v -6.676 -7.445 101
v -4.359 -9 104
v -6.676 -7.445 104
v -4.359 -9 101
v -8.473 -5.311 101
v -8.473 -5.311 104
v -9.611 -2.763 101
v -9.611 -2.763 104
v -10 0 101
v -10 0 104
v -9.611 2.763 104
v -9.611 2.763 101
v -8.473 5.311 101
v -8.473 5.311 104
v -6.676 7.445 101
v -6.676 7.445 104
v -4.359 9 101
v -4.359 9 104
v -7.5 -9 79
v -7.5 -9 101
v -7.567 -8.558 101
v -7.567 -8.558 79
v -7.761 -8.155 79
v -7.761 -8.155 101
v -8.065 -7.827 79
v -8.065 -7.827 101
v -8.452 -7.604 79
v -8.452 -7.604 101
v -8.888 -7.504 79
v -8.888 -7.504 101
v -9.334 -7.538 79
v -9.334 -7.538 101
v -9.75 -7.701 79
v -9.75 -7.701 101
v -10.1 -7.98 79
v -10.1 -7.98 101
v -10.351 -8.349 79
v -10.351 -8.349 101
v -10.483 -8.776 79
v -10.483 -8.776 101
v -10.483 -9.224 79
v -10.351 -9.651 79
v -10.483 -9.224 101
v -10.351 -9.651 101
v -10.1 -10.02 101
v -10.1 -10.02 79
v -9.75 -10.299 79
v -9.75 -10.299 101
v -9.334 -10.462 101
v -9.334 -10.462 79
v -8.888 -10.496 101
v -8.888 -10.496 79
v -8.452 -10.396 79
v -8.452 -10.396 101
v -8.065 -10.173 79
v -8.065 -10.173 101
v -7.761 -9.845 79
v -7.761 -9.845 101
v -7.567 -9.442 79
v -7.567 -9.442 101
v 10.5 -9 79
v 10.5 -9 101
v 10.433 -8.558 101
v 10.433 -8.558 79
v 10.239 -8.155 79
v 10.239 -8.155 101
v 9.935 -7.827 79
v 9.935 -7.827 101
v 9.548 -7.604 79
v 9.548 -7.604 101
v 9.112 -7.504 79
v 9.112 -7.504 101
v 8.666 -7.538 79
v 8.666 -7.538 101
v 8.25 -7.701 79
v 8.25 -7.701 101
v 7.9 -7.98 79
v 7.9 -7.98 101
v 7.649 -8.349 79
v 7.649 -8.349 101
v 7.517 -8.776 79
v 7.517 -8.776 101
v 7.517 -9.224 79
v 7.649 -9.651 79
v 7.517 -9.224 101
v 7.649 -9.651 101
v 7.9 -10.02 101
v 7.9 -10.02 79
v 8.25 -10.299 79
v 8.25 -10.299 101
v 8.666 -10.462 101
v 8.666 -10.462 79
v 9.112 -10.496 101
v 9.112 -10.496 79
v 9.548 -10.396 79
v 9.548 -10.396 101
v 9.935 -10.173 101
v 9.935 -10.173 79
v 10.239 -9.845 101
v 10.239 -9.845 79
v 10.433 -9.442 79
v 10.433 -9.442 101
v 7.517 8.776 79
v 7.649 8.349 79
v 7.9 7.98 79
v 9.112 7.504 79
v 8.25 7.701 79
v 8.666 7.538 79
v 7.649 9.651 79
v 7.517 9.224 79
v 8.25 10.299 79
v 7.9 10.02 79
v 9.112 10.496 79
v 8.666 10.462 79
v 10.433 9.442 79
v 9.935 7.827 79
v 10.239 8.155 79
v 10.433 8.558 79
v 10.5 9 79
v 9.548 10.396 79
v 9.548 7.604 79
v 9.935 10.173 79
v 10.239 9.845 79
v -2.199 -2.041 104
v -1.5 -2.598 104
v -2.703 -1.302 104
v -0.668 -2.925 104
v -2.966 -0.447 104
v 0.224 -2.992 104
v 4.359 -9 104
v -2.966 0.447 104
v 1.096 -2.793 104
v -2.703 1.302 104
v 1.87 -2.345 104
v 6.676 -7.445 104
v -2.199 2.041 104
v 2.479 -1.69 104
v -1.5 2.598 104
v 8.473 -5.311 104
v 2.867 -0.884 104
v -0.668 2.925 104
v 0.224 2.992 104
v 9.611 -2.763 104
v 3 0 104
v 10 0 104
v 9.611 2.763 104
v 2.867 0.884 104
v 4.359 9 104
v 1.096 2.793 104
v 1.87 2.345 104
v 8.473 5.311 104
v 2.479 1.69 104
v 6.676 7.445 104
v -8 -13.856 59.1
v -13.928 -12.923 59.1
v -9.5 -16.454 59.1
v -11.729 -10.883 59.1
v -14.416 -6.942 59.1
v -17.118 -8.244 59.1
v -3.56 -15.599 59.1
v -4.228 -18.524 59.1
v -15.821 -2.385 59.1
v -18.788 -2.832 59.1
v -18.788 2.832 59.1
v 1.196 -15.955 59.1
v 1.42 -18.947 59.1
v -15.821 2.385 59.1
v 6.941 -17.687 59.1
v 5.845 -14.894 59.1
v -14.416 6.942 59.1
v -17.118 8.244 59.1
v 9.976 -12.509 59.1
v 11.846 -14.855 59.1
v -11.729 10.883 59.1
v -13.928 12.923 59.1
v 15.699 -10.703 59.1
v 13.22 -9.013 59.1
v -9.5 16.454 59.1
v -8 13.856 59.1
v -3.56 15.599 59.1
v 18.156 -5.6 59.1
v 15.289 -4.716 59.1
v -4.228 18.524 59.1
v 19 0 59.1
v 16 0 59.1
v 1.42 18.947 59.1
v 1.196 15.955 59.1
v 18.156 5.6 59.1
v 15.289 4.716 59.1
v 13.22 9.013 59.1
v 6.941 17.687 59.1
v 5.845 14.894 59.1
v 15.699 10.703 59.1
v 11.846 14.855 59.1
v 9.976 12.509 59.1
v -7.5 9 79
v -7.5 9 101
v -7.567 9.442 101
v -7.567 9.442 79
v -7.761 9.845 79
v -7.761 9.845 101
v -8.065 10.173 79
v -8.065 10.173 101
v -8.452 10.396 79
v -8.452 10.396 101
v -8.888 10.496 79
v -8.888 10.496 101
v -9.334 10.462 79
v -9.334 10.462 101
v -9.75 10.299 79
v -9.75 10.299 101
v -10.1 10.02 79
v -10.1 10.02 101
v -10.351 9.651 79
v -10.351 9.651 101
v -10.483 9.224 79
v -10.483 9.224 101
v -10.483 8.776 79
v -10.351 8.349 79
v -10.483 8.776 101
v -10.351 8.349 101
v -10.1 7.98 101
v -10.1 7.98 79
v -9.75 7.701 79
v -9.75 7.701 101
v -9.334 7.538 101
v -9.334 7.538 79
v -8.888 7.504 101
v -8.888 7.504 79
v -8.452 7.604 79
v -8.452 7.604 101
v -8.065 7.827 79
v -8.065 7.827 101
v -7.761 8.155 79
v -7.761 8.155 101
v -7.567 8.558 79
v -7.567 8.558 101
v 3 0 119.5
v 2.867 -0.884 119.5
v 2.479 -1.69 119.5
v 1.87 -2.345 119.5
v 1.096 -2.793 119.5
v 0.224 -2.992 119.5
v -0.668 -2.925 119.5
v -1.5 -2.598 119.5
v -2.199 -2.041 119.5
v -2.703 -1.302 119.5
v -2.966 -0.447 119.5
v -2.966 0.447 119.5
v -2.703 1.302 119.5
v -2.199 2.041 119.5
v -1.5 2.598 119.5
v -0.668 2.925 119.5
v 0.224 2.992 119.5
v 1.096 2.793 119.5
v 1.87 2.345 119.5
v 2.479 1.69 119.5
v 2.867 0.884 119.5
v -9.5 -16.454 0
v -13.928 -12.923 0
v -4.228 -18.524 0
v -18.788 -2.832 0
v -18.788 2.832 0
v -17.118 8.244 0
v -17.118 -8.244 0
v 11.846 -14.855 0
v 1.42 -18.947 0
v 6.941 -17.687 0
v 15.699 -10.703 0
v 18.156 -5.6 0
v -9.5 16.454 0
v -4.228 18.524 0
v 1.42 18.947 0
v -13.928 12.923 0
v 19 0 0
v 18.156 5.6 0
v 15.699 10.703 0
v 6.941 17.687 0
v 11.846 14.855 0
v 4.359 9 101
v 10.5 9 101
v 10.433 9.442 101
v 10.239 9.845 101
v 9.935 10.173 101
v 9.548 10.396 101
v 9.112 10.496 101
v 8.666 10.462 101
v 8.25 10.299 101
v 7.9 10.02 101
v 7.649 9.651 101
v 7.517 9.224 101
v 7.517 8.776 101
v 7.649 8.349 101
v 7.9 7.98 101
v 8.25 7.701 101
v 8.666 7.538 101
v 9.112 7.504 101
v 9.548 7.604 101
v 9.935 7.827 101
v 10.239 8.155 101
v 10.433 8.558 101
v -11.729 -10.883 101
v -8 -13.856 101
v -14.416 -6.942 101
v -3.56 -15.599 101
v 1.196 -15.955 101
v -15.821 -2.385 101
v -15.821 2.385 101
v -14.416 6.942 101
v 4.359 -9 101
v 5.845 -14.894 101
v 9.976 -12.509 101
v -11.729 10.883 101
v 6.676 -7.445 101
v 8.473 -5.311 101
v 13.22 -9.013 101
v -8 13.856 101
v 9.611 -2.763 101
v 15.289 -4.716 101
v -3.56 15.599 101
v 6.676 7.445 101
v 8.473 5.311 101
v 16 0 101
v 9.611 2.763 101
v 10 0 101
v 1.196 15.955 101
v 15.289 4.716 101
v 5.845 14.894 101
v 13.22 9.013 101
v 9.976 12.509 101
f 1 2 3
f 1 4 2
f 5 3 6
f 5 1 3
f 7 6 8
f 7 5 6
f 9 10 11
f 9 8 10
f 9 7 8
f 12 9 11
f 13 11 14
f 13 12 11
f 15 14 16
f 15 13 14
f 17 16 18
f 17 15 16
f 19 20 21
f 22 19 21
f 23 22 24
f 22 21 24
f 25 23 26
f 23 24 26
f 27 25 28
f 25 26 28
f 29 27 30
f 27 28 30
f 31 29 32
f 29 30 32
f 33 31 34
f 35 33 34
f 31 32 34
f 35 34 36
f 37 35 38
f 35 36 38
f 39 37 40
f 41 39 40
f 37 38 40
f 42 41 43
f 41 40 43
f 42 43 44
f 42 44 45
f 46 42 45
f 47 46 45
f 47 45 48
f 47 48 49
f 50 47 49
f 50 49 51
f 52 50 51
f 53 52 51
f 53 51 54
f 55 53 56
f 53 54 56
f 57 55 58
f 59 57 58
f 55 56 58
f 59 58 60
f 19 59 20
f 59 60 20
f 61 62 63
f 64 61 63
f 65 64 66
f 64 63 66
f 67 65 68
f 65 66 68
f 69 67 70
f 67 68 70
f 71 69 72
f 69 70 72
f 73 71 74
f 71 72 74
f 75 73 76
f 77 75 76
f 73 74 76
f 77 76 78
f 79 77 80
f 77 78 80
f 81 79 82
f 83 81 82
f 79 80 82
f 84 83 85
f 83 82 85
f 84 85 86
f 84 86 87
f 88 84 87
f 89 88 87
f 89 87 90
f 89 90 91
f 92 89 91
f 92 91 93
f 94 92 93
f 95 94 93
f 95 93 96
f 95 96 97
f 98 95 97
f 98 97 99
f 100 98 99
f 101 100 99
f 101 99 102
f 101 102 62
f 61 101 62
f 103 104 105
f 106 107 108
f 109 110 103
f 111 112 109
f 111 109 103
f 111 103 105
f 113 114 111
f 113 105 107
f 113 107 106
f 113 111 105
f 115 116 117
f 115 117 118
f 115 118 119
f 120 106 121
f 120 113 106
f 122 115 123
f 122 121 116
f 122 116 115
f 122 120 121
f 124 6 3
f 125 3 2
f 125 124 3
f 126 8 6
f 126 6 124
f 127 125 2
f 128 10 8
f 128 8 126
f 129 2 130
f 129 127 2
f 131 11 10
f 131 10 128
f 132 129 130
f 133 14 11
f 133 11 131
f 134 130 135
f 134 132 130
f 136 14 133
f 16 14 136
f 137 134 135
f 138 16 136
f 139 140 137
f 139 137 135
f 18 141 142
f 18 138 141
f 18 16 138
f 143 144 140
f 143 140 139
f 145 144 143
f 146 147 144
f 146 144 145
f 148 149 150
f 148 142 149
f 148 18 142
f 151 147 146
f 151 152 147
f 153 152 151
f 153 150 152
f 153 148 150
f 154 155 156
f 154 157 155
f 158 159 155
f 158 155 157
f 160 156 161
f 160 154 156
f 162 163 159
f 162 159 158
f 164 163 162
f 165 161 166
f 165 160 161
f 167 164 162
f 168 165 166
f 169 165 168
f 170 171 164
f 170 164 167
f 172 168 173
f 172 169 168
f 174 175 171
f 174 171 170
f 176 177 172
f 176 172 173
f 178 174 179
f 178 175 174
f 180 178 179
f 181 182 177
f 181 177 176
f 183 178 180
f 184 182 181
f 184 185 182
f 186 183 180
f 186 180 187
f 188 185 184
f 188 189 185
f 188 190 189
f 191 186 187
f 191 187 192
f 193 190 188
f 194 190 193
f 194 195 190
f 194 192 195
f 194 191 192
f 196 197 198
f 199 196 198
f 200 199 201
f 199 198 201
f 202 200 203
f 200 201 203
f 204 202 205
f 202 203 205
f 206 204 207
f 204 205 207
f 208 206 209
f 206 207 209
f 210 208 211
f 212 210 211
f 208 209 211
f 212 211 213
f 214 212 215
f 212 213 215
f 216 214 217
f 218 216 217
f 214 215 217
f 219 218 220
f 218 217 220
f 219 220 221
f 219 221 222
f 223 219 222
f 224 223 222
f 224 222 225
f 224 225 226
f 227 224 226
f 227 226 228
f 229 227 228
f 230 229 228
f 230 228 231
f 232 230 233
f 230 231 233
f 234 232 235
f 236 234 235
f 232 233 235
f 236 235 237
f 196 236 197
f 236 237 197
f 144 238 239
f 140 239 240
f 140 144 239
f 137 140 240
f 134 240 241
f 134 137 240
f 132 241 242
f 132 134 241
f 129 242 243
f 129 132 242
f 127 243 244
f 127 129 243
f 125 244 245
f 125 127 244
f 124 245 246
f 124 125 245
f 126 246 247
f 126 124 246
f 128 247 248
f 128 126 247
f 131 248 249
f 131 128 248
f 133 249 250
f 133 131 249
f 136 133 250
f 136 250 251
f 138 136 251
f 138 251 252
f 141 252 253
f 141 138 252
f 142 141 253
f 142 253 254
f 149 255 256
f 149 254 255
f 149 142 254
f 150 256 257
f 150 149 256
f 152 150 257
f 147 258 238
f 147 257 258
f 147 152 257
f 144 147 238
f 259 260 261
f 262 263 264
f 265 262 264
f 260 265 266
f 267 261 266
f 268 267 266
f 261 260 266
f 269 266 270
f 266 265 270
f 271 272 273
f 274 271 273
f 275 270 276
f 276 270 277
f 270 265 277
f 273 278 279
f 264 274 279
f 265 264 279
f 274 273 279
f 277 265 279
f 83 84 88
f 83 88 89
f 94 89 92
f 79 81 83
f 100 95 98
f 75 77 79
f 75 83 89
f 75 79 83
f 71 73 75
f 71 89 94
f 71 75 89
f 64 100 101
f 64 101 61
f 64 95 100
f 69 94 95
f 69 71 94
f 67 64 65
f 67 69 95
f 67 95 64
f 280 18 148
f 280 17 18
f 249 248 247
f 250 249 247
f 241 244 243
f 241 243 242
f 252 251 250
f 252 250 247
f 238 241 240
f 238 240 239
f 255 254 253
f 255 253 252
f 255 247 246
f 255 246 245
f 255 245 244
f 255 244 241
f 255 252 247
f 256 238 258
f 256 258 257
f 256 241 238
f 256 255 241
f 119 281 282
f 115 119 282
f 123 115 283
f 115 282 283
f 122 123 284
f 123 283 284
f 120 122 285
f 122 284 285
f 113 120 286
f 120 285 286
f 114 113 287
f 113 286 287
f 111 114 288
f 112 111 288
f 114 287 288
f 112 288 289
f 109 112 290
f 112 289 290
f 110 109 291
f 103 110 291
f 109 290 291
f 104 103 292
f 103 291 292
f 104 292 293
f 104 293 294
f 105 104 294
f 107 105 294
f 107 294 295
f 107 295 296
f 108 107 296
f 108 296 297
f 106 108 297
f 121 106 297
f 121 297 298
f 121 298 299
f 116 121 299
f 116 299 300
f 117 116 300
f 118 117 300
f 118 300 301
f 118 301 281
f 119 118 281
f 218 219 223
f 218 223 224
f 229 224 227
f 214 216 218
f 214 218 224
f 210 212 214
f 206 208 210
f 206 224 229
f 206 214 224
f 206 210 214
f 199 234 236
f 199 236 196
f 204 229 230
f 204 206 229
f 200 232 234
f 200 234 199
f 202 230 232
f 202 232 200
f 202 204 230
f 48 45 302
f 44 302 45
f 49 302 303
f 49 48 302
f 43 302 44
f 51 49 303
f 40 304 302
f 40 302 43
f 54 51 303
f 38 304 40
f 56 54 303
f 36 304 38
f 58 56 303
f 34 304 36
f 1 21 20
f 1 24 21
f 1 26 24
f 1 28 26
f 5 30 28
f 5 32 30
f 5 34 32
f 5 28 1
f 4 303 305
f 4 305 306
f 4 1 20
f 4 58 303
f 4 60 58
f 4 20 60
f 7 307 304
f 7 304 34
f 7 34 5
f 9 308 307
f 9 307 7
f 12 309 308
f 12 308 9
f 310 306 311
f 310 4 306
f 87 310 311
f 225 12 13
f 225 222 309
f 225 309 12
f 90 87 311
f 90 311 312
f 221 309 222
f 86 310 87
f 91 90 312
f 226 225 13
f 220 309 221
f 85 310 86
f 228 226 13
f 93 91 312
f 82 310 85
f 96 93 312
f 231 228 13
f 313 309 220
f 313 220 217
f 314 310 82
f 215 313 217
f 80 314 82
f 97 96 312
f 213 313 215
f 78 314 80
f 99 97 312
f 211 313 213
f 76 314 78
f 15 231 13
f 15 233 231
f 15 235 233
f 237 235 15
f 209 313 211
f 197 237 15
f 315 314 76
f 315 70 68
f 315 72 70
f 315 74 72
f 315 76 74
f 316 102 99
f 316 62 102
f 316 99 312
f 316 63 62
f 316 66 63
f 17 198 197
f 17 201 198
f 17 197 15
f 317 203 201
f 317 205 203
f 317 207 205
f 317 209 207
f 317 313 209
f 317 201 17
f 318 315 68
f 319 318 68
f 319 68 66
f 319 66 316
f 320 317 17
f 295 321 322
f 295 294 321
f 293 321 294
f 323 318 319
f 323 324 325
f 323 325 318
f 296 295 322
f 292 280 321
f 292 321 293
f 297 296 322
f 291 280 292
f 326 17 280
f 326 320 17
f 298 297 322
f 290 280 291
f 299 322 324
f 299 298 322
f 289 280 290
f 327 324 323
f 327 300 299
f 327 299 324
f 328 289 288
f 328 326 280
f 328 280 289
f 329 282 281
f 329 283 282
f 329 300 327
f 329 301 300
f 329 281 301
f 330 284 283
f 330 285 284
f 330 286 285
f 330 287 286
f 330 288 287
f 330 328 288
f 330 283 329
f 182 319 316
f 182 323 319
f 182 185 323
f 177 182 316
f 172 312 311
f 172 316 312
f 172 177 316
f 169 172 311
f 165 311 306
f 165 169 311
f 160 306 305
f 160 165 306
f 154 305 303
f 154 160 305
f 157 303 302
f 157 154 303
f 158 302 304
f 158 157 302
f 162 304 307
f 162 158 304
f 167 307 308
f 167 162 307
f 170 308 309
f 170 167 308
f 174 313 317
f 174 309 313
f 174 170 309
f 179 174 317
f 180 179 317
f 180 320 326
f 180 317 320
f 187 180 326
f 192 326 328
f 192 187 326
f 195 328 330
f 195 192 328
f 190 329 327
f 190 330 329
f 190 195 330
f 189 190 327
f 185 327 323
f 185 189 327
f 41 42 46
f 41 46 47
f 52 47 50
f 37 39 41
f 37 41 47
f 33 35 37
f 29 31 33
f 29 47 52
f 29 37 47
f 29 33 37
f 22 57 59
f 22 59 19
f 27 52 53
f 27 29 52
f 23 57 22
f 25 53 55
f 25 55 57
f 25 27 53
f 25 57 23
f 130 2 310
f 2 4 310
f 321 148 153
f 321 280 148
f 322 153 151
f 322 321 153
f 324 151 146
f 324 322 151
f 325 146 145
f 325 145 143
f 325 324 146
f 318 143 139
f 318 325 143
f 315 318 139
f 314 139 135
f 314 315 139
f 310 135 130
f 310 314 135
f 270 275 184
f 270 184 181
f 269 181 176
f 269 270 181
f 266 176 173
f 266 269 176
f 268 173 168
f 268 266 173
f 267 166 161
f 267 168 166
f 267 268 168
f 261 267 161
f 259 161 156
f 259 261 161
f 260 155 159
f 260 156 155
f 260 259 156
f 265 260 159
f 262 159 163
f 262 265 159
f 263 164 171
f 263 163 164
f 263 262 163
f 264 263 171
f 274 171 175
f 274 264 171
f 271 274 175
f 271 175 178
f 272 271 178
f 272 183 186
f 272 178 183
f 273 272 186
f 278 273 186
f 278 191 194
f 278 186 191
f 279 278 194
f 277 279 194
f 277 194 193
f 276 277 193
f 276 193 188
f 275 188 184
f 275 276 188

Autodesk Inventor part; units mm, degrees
ref_plane "YZ Plane" through (0, 0, 0) normal (1, 0, 0) x (0, 1, 0)
ref_plane "XZ Plane" through (0, 0, 0) normal (0, 1, 0) x (-1, 0, 0)
ref_plane "XY Plane" through (0, 0, 0) normal (0, 0, 1) x (1, 0, 0)
sketch "Sketch1" plane through (0, 0, 0) normal (0, 0, 1) x (1, 0, 0)
  circle A0 centre (0, 0) radius 19
  dimension "d0" = 38
extrude "Extrusion1" add sketch "Sketch1" along normal blind 59.1
sketch "Sketch2" plane through (0, 0, 59.1) normal (0, 0, 1) x (1, 0, 0)
  circle A0 centre (0, 0) radius 16
  dimension "d3" = 32
extrude "Extrusion2" add sketch "Sketch2" along normal blind 41.9
sketch "Sketch3" plane through (0, 0, 101) normal (0, 0, 1) x (1, 0, 0)
  circle A0 centre (0, 0) radius 10
  dimension "d6" = 20
extrude "Extrusion3" add sketch "Sketch3" along normal blind 3
sketch "Sketch4" plane through (0, 0, 104) normal (0, 0, 1) x (1, 0, 0)
  circle A0 centre (0, 0) radius 3
  dimension "d9" = 6
extrude "Extrusion4" add sketch "Sketch4" along normal blind 15.5
sketch "Sketch5" plane through (0, 0, 104) normal (0, 0, 1) x (1, 0, 0)
  line L0 (-9, -9) -> (9, -9) construction
  line L1 (9, -9) -> (9, 9) construction
  line L2 (9, 9) -> (-9, 9) construction
  line L3 (-9, 9) -> (-9, -9) construction
  line L4 (-9, -9) -> (9, 9) construction
  line L5 (9, -9) -> (-9, 9) construction
  circle A0 centre (9, 9) radius 1.5
  circle A1 centre (9, -9) radius 1.5
  circle A2 centre (-9, -9) radius 1.5
  circle A3 centre (-9, 9) radius 1.5
  point P0 (0, 0)
  dimension "d12" = 18
  dimension "d13" = 18
  dimension "d14" = 3
  dimension "d15" = 3
  dimension "d16" = 3
  dimension "d17" = 3
extrude "Extrusion5" cut sketch "Sketch5" against normal blind 25
sketch "Sketch6" plane through (0, 0, 101) normal (0, 0, 1) x (1, 0, 0)
  circle A0 centre (0, 0) radius 3 projected
  circle A1 centre (0, 0) radius 10 projected
  line L0 (-4.3589, -9) -> (4.3589, -9)
  line L1 (-4.3589, 9) -> (4.3589, 9)
  dimension "d20" = 18
extrude "Extrusion6" cut sketch "Sketch6" along normal through all contours L1 A1 | A1 L0
properties part number "12RPM Gear Motor"
